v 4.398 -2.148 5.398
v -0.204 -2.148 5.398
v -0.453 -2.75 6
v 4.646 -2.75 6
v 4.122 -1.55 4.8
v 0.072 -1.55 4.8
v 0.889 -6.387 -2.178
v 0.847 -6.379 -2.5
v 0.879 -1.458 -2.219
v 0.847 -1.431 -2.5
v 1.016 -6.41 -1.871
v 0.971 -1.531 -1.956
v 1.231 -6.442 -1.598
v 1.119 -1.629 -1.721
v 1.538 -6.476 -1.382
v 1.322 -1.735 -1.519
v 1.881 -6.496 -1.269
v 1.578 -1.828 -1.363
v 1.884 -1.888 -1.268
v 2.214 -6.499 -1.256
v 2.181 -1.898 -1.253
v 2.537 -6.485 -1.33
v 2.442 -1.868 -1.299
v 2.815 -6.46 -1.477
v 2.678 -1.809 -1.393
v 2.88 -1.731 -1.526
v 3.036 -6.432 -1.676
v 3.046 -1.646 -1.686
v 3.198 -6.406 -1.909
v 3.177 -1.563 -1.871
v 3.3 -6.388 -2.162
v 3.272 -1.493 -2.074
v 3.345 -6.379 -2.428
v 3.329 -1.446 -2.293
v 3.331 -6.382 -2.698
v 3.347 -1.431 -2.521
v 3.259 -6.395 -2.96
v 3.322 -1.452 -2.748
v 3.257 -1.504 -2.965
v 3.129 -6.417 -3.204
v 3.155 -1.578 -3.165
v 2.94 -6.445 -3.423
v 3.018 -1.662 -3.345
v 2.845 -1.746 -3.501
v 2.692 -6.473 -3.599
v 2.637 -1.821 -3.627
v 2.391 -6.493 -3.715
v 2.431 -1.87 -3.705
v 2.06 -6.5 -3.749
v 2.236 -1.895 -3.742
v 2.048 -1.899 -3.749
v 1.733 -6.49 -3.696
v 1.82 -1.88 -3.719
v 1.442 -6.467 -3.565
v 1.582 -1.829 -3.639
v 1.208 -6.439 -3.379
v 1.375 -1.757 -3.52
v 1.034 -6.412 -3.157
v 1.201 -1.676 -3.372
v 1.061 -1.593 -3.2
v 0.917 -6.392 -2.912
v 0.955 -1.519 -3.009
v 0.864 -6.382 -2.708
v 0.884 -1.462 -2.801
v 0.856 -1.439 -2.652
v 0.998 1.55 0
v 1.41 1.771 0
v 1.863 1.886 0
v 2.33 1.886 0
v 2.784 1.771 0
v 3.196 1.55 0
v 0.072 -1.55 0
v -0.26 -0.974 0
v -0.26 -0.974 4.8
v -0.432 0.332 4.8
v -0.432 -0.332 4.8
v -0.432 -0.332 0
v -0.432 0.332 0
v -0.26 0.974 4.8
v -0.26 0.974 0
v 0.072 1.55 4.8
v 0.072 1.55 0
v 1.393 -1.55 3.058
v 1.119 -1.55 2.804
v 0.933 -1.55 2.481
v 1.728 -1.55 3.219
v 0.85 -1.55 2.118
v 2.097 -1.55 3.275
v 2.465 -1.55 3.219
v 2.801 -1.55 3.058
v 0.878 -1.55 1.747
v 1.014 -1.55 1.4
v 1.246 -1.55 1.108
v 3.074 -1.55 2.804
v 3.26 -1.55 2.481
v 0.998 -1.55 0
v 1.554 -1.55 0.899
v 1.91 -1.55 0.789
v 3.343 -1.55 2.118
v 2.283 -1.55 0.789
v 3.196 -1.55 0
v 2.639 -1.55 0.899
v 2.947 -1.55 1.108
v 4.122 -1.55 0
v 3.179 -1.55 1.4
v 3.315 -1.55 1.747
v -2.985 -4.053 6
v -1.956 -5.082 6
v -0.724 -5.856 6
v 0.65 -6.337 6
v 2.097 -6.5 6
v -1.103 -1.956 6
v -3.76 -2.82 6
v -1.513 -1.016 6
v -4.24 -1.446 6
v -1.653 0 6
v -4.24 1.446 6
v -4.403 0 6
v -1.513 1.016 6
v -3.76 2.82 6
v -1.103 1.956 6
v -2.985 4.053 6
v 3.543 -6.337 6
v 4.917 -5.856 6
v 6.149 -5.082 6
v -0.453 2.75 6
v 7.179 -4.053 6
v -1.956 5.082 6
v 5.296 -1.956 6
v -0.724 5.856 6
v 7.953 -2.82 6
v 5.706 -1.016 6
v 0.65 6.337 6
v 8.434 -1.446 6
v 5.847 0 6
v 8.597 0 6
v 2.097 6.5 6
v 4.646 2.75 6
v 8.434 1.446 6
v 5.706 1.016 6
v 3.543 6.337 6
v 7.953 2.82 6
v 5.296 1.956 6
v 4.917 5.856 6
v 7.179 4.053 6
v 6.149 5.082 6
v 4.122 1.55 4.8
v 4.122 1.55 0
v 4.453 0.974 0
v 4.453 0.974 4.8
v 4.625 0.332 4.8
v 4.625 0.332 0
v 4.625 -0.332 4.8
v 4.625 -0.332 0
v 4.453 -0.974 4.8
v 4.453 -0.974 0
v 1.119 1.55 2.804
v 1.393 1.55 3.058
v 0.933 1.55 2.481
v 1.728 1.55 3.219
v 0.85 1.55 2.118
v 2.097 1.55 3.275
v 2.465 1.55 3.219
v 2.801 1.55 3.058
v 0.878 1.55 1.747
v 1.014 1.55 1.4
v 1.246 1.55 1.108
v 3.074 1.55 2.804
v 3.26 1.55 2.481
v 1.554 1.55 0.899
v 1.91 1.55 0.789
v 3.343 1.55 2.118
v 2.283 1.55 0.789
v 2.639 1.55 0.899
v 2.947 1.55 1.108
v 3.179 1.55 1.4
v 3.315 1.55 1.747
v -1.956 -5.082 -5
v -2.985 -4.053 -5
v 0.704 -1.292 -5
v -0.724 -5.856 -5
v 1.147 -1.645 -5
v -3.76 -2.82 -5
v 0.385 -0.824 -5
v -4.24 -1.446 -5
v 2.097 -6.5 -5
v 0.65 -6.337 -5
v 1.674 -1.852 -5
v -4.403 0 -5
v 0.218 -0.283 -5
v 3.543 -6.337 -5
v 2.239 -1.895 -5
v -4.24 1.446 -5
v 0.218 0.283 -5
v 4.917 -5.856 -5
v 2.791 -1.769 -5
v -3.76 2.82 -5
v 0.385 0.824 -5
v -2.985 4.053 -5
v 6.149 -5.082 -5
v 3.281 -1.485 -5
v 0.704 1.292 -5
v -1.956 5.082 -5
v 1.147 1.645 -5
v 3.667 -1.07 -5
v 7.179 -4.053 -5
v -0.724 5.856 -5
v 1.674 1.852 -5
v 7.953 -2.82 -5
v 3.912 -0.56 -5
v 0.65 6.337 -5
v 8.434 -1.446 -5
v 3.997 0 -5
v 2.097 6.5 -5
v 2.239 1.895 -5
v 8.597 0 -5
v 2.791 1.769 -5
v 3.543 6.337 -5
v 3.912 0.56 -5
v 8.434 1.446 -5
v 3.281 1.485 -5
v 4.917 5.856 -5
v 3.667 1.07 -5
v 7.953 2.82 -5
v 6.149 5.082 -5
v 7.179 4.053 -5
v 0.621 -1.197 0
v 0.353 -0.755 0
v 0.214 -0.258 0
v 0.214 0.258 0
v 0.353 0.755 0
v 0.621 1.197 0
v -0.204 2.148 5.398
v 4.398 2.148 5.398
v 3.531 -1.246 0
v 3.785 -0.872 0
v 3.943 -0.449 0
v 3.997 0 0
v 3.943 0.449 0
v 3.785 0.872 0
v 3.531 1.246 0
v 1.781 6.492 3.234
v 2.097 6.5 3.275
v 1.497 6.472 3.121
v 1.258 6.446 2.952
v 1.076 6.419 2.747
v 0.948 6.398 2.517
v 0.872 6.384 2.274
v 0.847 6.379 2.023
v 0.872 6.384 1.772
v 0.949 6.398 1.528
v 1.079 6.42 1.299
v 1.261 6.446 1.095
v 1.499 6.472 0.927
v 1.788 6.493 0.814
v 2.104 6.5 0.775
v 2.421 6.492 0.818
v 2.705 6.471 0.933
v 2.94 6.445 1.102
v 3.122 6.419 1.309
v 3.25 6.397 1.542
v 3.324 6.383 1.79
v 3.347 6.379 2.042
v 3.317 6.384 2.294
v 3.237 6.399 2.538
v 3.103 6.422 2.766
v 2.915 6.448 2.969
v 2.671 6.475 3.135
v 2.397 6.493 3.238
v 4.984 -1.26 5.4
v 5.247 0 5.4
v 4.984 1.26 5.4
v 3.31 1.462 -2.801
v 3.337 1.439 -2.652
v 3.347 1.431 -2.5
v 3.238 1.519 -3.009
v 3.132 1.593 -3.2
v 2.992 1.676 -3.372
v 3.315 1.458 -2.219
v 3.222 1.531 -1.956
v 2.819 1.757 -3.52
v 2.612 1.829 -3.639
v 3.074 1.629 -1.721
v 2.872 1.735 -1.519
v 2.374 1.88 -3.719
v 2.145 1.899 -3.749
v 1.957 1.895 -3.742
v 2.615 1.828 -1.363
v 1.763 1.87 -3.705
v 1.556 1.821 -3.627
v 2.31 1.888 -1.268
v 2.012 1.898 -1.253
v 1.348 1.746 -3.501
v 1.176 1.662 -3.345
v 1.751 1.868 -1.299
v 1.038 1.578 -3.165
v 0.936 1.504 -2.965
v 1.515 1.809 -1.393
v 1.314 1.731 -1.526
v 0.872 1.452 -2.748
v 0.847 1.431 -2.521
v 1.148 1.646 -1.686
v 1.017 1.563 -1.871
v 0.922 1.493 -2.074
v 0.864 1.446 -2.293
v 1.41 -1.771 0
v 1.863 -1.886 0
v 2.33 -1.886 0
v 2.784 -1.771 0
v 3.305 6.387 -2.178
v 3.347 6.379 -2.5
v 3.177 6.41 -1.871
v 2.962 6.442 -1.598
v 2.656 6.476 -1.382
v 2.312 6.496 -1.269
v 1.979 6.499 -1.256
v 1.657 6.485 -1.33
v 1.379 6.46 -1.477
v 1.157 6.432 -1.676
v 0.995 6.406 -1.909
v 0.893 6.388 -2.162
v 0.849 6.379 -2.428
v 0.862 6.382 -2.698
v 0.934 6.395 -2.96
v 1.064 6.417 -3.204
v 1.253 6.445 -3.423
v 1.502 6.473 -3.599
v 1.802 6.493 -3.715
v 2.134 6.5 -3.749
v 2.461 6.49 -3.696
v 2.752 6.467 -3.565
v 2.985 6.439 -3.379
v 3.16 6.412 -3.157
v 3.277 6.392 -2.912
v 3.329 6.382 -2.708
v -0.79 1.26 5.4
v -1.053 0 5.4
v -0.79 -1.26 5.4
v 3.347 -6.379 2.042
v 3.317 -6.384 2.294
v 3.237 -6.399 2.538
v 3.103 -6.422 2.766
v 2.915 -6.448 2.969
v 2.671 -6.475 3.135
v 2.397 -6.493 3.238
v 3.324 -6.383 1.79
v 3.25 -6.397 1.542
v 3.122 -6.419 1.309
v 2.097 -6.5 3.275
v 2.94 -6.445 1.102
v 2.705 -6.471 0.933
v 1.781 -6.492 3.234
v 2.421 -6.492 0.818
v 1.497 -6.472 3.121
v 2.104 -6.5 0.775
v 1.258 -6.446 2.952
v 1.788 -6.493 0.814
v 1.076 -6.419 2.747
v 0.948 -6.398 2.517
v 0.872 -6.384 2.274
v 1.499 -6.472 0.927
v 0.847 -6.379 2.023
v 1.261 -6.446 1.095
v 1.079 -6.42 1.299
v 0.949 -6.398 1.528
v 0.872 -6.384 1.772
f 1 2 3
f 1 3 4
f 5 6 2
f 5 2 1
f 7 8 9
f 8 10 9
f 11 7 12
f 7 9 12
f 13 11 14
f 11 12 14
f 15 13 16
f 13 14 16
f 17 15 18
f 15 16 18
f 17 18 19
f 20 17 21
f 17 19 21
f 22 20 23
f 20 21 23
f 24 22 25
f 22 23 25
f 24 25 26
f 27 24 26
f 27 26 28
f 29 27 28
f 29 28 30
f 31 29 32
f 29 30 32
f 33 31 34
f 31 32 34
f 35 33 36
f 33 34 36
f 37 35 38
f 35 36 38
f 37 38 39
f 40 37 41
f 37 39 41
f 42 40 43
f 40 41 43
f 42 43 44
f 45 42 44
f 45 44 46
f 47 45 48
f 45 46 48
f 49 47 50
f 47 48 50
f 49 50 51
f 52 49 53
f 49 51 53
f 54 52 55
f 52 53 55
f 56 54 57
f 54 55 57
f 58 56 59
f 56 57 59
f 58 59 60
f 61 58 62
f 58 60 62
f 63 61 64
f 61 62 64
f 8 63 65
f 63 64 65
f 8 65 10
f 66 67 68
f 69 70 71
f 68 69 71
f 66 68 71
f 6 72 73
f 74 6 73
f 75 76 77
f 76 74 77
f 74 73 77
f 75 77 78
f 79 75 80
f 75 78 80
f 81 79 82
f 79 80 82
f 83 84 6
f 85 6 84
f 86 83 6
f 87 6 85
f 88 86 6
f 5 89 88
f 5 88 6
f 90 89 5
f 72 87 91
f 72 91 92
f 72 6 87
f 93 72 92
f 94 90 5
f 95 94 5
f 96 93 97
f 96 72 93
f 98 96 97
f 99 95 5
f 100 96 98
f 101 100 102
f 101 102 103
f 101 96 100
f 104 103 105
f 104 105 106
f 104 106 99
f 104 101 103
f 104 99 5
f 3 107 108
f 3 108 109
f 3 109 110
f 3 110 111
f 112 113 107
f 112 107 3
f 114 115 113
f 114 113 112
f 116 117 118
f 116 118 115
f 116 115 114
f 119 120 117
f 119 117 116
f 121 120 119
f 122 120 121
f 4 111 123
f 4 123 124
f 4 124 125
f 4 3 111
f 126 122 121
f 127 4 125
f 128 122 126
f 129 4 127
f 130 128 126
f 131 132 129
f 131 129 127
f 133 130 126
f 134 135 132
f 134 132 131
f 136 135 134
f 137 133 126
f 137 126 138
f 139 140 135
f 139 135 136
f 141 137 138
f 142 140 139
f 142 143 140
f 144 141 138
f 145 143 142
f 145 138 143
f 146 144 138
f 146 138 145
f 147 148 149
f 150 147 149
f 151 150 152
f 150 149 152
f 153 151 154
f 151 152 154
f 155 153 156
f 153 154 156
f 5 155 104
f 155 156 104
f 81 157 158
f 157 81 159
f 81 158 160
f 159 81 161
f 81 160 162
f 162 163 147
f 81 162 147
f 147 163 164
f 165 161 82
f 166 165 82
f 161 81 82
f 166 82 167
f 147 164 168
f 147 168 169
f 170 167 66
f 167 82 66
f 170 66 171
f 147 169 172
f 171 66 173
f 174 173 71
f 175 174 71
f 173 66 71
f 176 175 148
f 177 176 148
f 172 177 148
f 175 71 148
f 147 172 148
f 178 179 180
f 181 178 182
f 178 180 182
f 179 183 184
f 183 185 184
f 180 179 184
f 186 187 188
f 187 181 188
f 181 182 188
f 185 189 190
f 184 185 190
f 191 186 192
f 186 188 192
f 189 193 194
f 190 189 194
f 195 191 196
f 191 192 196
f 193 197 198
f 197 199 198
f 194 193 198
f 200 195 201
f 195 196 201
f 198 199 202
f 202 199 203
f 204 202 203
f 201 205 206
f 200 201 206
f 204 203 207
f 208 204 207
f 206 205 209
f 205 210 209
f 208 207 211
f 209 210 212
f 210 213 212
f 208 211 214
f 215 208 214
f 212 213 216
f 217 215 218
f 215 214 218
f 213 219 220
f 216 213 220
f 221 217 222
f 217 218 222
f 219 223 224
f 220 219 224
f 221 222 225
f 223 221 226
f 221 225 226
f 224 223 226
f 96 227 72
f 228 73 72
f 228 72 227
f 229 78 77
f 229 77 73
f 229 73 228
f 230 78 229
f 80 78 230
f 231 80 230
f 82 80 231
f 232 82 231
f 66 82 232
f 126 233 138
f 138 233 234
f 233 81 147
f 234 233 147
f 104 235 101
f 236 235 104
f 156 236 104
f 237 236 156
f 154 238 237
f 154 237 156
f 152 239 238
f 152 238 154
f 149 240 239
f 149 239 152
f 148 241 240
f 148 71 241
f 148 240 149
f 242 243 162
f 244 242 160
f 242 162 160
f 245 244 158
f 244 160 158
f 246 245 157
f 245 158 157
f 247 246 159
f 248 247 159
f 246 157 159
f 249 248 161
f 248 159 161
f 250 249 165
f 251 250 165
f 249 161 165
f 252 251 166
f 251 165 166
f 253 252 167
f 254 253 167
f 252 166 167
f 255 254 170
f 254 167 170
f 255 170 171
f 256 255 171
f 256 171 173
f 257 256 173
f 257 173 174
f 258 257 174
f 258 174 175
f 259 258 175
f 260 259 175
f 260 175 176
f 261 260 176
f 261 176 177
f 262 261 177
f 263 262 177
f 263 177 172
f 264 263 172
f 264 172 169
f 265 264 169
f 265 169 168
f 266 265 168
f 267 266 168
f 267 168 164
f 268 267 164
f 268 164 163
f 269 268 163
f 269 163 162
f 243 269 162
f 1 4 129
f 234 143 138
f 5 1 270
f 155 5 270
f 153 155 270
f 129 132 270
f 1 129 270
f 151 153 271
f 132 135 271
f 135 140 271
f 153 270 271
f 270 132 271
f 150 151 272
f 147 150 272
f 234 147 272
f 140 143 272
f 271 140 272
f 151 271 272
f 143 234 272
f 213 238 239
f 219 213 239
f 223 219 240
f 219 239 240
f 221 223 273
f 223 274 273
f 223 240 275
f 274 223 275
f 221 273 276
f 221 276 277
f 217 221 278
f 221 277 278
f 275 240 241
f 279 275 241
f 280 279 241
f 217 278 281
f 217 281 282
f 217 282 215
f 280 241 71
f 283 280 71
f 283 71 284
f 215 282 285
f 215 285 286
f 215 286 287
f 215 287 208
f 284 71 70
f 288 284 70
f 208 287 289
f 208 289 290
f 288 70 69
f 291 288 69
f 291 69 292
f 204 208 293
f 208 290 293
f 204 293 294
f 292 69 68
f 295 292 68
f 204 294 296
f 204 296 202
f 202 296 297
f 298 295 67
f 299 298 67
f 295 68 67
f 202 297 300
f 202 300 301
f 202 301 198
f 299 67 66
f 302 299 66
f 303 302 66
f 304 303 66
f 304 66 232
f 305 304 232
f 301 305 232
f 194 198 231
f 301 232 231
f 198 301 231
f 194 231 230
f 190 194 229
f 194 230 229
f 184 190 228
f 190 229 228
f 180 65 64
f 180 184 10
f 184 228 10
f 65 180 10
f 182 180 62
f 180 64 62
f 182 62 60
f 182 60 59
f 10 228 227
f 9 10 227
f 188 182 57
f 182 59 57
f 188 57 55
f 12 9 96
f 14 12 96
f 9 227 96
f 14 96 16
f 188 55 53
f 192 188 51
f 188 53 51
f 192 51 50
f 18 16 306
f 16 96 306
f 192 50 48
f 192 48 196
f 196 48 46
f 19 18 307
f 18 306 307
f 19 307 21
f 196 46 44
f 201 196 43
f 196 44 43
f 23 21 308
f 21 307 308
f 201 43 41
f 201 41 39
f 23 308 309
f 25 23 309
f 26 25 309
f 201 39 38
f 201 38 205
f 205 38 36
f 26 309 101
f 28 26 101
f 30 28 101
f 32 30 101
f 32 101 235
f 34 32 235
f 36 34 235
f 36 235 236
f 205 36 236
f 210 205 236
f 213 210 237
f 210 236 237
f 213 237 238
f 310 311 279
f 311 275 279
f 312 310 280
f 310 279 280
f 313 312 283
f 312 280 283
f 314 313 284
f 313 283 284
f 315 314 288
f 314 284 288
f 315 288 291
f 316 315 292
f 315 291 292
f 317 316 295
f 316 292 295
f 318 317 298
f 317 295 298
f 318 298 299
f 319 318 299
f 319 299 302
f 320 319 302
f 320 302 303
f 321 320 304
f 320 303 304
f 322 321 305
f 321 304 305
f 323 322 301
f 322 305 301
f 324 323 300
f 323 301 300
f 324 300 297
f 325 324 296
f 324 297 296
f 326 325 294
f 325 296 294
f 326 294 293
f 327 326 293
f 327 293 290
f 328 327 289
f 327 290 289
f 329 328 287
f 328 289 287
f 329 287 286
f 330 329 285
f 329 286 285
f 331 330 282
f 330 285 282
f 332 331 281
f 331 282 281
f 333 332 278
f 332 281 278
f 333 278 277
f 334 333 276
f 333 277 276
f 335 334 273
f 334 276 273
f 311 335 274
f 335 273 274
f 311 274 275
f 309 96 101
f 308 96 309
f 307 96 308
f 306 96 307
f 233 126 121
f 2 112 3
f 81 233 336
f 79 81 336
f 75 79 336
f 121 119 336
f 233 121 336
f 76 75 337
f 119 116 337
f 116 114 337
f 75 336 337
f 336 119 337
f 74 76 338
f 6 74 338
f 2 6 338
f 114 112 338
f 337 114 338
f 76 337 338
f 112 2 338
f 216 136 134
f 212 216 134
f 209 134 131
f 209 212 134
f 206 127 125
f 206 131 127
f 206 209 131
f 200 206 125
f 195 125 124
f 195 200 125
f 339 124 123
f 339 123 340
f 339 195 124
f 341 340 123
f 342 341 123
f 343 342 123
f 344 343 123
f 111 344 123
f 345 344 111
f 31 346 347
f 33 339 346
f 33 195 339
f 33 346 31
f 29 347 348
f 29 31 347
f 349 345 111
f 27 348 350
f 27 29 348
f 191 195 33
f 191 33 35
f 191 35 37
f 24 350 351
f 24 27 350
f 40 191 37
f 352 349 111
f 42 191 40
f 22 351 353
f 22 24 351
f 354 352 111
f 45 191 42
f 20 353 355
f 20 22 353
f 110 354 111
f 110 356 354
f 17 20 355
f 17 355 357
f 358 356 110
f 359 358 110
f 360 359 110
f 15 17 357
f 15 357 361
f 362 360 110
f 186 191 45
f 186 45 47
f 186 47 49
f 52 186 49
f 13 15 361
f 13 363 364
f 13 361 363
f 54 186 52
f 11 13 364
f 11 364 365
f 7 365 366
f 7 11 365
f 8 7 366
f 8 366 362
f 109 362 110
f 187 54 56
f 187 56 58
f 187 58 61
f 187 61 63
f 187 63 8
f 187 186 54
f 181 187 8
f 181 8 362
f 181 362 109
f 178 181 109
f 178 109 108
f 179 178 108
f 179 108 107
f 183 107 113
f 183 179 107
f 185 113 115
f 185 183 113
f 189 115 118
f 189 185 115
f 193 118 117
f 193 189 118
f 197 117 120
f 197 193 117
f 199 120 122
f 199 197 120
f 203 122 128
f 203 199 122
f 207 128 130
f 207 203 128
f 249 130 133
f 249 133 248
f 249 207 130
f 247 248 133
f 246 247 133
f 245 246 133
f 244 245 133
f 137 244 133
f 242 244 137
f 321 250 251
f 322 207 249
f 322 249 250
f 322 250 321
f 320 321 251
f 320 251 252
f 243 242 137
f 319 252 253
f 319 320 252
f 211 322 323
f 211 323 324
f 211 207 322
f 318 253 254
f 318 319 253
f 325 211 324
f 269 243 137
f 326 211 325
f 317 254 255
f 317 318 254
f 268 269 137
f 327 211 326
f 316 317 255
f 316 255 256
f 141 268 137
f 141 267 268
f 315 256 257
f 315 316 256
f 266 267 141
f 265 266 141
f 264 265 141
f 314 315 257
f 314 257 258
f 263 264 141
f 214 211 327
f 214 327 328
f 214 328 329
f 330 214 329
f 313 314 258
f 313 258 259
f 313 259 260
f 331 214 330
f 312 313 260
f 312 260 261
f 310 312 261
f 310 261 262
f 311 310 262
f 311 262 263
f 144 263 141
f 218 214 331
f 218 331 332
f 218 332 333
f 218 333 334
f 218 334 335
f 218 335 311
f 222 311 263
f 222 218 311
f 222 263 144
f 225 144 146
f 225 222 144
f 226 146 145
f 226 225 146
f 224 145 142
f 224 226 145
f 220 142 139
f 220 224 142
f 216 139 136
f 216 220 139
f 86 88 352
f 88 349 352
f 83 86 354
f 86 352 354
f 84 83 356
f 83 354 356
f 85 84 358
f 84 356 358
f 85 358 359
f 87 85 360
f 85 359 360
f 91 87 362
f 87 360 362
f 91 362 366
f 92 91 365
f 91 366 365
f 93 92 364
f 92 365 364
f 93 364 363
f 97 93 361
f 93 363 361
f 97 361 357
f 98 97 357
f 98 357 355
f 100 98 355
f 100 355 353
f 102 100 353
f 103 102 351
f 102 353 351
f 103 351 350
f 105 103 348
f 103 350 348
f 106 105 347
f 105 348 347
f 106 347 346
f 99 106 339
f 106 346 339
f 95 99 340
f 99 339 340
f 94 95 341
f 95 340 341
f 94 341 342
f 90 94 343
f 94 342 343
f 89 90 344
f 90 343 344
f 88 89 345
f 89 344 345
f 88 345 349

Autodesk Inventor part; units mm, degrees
ref_plane "YZ Plane" through (0, 0, 0) normal (1, 0, 0) x (0, 1, 0)
ref_plane "XZ Plane" through (0, 0, 0) normal (0, 1, 0) x (-1, 0, 0)
sketch "Sketch1" plane through (0, 0, 0) normal (0, 0, 1) x (1, 0, 0)
  line L0 (0.8467, -0.7217) -> (0.8467, 0.7217) construction
  line L1 (0.8467, 0.7217) -> (2.0967, 1.4434) construction
  line L2 (2.0967, 1.4434) -> (3.3467, 0.7217) construction
  line L3 (3.3467, 0.7217) -> (3.3467, -0.7217) construction
  line L4 (3.3467, -0.7217) -> (2.0967, -1.4434) construction
  line L5 (2.0967, -1.4434) -> (0.8467, -0.7217) construction
  circle A0 centre (2.0967, 0) radius 2.45 construction
  line L6 (4.8467, -1.5877) -> (3.4717, -2.3816) construction
  line L7 (15.0967, 3) -> (15.0967, -3) construction
  line L8 (-10.9033, 3) -> (-10.9033, -3) construction
  line L9 (-0.6533, 0) -> (-0.6533, 1.5877) construction
  circle A1 centre (2.0967, 0) radius 5
  circle A2 centre (2.0967, 0) radius 1.7 projected
  line L10 (-10.9033, -3) -> (15.0967, -3) projected
  line L11 (-10.9033, 3) -> (15.0967, 3) projected
  circle A3 centre (2.0967, 0) radius 1.9
  circle A4 centre (2.0967, 0) radius 6.5
  point P0 (0.4719, -0.5)
  point P1 (3.7215, -0.5)
  dimension "d10" = 3.8
  dimension "d13" = 13
ref_plane "Work Plane1" through (-20.8033, -6.3, -5.9) normal (0, 0, 1) x (1, 0, 0)
extrude "Extrusion1" add sketch "Sketch1" against normal blind 5 contours A1 L10 L11 | A1 L11 A4 L10 | L11 A1 | A1 L11 A4 | L10 A4 A1 | A1 L10 | A1 L10 A4 L11
sketch "Sketch2" plane through (2.0967, 0, 0) normal (0, 0, 1) x (1, 0, 0)
  line L0 (-2, 1.5) -> (2, 1.5) construction
  arc A0 (2.5, 0) -> (2, 1.5) centre (0, 0) ccw construction
  arc A1 (-2, 1.5) -> (-2.5, 0) centre (0, 0) ccw construction
  line L1 (2, -1.5) -> (-2, -1.5) construction
  arc A2 (-2.5, 0) -> (2.5, 0) centre (0, 0) ccw construction
  line L2 (2.0248, 1.55) -> (-2.0248, 1.55) construction
  arc A3 (-2.0248, 1.55) -> (-2.55, 0) centre (0, 0) ccw construction
  arc A4 (-2.55, 0) -> (2.55, 0) centre (0, 0) ccw construction
  arc A5 (2.55, 0) -> (2.0248, 1.55) centre (0, 0) ccw construction
  line L3 (-2.0248, 1.55) -> (2.0248, 1.55) construction
  line L4 (-2.0248, 1.55) -> (2.0248, 1.55)
  line L5 (-2.0248, -1.55) -> (2.0248, -1.55)
  arc A6 (-2.0248, 1.55) -> (-2.0248, -1.55) centre (0, 0) ccw
  arc A7 (2.0248, -1.55) -> (2.0248, 1.55) centre (0, 0) ccw
  circle A8 centre (0, 0) radius 6.5 projected
  point P0 (-2.0967, 0)
  dimension "d11" = 3.1
  dimension "d12" = 2.55
extrude "Extrusion2" add sketch "Sketch2" along normal blind 6
chamfer "Chamfer1" distance 1.2 angle 45 4 edges at (2.0967, 1.55, 6) (-0.4533, 0, 6) (2.0967, -1.55, 6) (4.6467, 0, 6)
sketch "Sketch3" plane through (0, 0, 0) normal (0, 1, 0) x (-1, 0, 0)
  line L0 (-4.6467, 0) -> (-4.6467, 4.8) projected
  line L1 (0.4533, 0) -> (0.4533, 4.8) projected
  line L2 (-8.5967, -5) -> (4.4033, -5) projected
  circle A0 centre (-2.0967, -2.5) radius 1.25
  line L3 (-8.5967, -5) -> (4.4033, -5) projected
  point P0 (0, 0)
  point P1 (-8.5967, 0)
  point P2 (4.4033, 0)
  dimension "d14" = 2.5
  dimension "d15" = 2.5
extrude "Extrusion3" cut sketch "Sketch3" against normal blind 10
pattern_circular "Circular Pattern1" count 2 over 360 about axis through (2.0967, 0, 0) along (0, 0, -1) of "Extrusion3"
sketch "Sketch4" plane through (0.0718, -1.55, 0) normal (0, 1, 0) x (1, 0, 0)
  line L0 (0, -4.8) -> (4.0497, -4.8) projected
  line L1 (-4.4752, -6) -> (8.5248, -6) projected
  line L2 (8.5248, 5) -> (-4.4752, 5) projected
  line L3 (4.0497, -4.8) -> (0, -4.8) projected
  line L4 (4.0497, 0) -> (4.0497, -4.8) projected
  line L5 (0.926, 0) -> (3.1237, 0) projected
  line L6 (0, 0) -> (0, -4.8) projected
  circle A0 centre (2.0248, -2.0248) radius 2.0248
  line L7 (3.1237, 0) -> (4.0497, 0) projected
  line L8 (0, 0) -> (0.926, 0) projected
  point P0 (-0.0718, 0)
  point P1 (3.2748, 2.5)
  point P2 (0.7748, 2.5)
hole "Hole1" at (2.0967, -1.55, 2.0248) direction (0, -1, 0) diameter 2.5 end through all both
properties part number "30_Coupling_Screw_28BYJ_M4_v2"
